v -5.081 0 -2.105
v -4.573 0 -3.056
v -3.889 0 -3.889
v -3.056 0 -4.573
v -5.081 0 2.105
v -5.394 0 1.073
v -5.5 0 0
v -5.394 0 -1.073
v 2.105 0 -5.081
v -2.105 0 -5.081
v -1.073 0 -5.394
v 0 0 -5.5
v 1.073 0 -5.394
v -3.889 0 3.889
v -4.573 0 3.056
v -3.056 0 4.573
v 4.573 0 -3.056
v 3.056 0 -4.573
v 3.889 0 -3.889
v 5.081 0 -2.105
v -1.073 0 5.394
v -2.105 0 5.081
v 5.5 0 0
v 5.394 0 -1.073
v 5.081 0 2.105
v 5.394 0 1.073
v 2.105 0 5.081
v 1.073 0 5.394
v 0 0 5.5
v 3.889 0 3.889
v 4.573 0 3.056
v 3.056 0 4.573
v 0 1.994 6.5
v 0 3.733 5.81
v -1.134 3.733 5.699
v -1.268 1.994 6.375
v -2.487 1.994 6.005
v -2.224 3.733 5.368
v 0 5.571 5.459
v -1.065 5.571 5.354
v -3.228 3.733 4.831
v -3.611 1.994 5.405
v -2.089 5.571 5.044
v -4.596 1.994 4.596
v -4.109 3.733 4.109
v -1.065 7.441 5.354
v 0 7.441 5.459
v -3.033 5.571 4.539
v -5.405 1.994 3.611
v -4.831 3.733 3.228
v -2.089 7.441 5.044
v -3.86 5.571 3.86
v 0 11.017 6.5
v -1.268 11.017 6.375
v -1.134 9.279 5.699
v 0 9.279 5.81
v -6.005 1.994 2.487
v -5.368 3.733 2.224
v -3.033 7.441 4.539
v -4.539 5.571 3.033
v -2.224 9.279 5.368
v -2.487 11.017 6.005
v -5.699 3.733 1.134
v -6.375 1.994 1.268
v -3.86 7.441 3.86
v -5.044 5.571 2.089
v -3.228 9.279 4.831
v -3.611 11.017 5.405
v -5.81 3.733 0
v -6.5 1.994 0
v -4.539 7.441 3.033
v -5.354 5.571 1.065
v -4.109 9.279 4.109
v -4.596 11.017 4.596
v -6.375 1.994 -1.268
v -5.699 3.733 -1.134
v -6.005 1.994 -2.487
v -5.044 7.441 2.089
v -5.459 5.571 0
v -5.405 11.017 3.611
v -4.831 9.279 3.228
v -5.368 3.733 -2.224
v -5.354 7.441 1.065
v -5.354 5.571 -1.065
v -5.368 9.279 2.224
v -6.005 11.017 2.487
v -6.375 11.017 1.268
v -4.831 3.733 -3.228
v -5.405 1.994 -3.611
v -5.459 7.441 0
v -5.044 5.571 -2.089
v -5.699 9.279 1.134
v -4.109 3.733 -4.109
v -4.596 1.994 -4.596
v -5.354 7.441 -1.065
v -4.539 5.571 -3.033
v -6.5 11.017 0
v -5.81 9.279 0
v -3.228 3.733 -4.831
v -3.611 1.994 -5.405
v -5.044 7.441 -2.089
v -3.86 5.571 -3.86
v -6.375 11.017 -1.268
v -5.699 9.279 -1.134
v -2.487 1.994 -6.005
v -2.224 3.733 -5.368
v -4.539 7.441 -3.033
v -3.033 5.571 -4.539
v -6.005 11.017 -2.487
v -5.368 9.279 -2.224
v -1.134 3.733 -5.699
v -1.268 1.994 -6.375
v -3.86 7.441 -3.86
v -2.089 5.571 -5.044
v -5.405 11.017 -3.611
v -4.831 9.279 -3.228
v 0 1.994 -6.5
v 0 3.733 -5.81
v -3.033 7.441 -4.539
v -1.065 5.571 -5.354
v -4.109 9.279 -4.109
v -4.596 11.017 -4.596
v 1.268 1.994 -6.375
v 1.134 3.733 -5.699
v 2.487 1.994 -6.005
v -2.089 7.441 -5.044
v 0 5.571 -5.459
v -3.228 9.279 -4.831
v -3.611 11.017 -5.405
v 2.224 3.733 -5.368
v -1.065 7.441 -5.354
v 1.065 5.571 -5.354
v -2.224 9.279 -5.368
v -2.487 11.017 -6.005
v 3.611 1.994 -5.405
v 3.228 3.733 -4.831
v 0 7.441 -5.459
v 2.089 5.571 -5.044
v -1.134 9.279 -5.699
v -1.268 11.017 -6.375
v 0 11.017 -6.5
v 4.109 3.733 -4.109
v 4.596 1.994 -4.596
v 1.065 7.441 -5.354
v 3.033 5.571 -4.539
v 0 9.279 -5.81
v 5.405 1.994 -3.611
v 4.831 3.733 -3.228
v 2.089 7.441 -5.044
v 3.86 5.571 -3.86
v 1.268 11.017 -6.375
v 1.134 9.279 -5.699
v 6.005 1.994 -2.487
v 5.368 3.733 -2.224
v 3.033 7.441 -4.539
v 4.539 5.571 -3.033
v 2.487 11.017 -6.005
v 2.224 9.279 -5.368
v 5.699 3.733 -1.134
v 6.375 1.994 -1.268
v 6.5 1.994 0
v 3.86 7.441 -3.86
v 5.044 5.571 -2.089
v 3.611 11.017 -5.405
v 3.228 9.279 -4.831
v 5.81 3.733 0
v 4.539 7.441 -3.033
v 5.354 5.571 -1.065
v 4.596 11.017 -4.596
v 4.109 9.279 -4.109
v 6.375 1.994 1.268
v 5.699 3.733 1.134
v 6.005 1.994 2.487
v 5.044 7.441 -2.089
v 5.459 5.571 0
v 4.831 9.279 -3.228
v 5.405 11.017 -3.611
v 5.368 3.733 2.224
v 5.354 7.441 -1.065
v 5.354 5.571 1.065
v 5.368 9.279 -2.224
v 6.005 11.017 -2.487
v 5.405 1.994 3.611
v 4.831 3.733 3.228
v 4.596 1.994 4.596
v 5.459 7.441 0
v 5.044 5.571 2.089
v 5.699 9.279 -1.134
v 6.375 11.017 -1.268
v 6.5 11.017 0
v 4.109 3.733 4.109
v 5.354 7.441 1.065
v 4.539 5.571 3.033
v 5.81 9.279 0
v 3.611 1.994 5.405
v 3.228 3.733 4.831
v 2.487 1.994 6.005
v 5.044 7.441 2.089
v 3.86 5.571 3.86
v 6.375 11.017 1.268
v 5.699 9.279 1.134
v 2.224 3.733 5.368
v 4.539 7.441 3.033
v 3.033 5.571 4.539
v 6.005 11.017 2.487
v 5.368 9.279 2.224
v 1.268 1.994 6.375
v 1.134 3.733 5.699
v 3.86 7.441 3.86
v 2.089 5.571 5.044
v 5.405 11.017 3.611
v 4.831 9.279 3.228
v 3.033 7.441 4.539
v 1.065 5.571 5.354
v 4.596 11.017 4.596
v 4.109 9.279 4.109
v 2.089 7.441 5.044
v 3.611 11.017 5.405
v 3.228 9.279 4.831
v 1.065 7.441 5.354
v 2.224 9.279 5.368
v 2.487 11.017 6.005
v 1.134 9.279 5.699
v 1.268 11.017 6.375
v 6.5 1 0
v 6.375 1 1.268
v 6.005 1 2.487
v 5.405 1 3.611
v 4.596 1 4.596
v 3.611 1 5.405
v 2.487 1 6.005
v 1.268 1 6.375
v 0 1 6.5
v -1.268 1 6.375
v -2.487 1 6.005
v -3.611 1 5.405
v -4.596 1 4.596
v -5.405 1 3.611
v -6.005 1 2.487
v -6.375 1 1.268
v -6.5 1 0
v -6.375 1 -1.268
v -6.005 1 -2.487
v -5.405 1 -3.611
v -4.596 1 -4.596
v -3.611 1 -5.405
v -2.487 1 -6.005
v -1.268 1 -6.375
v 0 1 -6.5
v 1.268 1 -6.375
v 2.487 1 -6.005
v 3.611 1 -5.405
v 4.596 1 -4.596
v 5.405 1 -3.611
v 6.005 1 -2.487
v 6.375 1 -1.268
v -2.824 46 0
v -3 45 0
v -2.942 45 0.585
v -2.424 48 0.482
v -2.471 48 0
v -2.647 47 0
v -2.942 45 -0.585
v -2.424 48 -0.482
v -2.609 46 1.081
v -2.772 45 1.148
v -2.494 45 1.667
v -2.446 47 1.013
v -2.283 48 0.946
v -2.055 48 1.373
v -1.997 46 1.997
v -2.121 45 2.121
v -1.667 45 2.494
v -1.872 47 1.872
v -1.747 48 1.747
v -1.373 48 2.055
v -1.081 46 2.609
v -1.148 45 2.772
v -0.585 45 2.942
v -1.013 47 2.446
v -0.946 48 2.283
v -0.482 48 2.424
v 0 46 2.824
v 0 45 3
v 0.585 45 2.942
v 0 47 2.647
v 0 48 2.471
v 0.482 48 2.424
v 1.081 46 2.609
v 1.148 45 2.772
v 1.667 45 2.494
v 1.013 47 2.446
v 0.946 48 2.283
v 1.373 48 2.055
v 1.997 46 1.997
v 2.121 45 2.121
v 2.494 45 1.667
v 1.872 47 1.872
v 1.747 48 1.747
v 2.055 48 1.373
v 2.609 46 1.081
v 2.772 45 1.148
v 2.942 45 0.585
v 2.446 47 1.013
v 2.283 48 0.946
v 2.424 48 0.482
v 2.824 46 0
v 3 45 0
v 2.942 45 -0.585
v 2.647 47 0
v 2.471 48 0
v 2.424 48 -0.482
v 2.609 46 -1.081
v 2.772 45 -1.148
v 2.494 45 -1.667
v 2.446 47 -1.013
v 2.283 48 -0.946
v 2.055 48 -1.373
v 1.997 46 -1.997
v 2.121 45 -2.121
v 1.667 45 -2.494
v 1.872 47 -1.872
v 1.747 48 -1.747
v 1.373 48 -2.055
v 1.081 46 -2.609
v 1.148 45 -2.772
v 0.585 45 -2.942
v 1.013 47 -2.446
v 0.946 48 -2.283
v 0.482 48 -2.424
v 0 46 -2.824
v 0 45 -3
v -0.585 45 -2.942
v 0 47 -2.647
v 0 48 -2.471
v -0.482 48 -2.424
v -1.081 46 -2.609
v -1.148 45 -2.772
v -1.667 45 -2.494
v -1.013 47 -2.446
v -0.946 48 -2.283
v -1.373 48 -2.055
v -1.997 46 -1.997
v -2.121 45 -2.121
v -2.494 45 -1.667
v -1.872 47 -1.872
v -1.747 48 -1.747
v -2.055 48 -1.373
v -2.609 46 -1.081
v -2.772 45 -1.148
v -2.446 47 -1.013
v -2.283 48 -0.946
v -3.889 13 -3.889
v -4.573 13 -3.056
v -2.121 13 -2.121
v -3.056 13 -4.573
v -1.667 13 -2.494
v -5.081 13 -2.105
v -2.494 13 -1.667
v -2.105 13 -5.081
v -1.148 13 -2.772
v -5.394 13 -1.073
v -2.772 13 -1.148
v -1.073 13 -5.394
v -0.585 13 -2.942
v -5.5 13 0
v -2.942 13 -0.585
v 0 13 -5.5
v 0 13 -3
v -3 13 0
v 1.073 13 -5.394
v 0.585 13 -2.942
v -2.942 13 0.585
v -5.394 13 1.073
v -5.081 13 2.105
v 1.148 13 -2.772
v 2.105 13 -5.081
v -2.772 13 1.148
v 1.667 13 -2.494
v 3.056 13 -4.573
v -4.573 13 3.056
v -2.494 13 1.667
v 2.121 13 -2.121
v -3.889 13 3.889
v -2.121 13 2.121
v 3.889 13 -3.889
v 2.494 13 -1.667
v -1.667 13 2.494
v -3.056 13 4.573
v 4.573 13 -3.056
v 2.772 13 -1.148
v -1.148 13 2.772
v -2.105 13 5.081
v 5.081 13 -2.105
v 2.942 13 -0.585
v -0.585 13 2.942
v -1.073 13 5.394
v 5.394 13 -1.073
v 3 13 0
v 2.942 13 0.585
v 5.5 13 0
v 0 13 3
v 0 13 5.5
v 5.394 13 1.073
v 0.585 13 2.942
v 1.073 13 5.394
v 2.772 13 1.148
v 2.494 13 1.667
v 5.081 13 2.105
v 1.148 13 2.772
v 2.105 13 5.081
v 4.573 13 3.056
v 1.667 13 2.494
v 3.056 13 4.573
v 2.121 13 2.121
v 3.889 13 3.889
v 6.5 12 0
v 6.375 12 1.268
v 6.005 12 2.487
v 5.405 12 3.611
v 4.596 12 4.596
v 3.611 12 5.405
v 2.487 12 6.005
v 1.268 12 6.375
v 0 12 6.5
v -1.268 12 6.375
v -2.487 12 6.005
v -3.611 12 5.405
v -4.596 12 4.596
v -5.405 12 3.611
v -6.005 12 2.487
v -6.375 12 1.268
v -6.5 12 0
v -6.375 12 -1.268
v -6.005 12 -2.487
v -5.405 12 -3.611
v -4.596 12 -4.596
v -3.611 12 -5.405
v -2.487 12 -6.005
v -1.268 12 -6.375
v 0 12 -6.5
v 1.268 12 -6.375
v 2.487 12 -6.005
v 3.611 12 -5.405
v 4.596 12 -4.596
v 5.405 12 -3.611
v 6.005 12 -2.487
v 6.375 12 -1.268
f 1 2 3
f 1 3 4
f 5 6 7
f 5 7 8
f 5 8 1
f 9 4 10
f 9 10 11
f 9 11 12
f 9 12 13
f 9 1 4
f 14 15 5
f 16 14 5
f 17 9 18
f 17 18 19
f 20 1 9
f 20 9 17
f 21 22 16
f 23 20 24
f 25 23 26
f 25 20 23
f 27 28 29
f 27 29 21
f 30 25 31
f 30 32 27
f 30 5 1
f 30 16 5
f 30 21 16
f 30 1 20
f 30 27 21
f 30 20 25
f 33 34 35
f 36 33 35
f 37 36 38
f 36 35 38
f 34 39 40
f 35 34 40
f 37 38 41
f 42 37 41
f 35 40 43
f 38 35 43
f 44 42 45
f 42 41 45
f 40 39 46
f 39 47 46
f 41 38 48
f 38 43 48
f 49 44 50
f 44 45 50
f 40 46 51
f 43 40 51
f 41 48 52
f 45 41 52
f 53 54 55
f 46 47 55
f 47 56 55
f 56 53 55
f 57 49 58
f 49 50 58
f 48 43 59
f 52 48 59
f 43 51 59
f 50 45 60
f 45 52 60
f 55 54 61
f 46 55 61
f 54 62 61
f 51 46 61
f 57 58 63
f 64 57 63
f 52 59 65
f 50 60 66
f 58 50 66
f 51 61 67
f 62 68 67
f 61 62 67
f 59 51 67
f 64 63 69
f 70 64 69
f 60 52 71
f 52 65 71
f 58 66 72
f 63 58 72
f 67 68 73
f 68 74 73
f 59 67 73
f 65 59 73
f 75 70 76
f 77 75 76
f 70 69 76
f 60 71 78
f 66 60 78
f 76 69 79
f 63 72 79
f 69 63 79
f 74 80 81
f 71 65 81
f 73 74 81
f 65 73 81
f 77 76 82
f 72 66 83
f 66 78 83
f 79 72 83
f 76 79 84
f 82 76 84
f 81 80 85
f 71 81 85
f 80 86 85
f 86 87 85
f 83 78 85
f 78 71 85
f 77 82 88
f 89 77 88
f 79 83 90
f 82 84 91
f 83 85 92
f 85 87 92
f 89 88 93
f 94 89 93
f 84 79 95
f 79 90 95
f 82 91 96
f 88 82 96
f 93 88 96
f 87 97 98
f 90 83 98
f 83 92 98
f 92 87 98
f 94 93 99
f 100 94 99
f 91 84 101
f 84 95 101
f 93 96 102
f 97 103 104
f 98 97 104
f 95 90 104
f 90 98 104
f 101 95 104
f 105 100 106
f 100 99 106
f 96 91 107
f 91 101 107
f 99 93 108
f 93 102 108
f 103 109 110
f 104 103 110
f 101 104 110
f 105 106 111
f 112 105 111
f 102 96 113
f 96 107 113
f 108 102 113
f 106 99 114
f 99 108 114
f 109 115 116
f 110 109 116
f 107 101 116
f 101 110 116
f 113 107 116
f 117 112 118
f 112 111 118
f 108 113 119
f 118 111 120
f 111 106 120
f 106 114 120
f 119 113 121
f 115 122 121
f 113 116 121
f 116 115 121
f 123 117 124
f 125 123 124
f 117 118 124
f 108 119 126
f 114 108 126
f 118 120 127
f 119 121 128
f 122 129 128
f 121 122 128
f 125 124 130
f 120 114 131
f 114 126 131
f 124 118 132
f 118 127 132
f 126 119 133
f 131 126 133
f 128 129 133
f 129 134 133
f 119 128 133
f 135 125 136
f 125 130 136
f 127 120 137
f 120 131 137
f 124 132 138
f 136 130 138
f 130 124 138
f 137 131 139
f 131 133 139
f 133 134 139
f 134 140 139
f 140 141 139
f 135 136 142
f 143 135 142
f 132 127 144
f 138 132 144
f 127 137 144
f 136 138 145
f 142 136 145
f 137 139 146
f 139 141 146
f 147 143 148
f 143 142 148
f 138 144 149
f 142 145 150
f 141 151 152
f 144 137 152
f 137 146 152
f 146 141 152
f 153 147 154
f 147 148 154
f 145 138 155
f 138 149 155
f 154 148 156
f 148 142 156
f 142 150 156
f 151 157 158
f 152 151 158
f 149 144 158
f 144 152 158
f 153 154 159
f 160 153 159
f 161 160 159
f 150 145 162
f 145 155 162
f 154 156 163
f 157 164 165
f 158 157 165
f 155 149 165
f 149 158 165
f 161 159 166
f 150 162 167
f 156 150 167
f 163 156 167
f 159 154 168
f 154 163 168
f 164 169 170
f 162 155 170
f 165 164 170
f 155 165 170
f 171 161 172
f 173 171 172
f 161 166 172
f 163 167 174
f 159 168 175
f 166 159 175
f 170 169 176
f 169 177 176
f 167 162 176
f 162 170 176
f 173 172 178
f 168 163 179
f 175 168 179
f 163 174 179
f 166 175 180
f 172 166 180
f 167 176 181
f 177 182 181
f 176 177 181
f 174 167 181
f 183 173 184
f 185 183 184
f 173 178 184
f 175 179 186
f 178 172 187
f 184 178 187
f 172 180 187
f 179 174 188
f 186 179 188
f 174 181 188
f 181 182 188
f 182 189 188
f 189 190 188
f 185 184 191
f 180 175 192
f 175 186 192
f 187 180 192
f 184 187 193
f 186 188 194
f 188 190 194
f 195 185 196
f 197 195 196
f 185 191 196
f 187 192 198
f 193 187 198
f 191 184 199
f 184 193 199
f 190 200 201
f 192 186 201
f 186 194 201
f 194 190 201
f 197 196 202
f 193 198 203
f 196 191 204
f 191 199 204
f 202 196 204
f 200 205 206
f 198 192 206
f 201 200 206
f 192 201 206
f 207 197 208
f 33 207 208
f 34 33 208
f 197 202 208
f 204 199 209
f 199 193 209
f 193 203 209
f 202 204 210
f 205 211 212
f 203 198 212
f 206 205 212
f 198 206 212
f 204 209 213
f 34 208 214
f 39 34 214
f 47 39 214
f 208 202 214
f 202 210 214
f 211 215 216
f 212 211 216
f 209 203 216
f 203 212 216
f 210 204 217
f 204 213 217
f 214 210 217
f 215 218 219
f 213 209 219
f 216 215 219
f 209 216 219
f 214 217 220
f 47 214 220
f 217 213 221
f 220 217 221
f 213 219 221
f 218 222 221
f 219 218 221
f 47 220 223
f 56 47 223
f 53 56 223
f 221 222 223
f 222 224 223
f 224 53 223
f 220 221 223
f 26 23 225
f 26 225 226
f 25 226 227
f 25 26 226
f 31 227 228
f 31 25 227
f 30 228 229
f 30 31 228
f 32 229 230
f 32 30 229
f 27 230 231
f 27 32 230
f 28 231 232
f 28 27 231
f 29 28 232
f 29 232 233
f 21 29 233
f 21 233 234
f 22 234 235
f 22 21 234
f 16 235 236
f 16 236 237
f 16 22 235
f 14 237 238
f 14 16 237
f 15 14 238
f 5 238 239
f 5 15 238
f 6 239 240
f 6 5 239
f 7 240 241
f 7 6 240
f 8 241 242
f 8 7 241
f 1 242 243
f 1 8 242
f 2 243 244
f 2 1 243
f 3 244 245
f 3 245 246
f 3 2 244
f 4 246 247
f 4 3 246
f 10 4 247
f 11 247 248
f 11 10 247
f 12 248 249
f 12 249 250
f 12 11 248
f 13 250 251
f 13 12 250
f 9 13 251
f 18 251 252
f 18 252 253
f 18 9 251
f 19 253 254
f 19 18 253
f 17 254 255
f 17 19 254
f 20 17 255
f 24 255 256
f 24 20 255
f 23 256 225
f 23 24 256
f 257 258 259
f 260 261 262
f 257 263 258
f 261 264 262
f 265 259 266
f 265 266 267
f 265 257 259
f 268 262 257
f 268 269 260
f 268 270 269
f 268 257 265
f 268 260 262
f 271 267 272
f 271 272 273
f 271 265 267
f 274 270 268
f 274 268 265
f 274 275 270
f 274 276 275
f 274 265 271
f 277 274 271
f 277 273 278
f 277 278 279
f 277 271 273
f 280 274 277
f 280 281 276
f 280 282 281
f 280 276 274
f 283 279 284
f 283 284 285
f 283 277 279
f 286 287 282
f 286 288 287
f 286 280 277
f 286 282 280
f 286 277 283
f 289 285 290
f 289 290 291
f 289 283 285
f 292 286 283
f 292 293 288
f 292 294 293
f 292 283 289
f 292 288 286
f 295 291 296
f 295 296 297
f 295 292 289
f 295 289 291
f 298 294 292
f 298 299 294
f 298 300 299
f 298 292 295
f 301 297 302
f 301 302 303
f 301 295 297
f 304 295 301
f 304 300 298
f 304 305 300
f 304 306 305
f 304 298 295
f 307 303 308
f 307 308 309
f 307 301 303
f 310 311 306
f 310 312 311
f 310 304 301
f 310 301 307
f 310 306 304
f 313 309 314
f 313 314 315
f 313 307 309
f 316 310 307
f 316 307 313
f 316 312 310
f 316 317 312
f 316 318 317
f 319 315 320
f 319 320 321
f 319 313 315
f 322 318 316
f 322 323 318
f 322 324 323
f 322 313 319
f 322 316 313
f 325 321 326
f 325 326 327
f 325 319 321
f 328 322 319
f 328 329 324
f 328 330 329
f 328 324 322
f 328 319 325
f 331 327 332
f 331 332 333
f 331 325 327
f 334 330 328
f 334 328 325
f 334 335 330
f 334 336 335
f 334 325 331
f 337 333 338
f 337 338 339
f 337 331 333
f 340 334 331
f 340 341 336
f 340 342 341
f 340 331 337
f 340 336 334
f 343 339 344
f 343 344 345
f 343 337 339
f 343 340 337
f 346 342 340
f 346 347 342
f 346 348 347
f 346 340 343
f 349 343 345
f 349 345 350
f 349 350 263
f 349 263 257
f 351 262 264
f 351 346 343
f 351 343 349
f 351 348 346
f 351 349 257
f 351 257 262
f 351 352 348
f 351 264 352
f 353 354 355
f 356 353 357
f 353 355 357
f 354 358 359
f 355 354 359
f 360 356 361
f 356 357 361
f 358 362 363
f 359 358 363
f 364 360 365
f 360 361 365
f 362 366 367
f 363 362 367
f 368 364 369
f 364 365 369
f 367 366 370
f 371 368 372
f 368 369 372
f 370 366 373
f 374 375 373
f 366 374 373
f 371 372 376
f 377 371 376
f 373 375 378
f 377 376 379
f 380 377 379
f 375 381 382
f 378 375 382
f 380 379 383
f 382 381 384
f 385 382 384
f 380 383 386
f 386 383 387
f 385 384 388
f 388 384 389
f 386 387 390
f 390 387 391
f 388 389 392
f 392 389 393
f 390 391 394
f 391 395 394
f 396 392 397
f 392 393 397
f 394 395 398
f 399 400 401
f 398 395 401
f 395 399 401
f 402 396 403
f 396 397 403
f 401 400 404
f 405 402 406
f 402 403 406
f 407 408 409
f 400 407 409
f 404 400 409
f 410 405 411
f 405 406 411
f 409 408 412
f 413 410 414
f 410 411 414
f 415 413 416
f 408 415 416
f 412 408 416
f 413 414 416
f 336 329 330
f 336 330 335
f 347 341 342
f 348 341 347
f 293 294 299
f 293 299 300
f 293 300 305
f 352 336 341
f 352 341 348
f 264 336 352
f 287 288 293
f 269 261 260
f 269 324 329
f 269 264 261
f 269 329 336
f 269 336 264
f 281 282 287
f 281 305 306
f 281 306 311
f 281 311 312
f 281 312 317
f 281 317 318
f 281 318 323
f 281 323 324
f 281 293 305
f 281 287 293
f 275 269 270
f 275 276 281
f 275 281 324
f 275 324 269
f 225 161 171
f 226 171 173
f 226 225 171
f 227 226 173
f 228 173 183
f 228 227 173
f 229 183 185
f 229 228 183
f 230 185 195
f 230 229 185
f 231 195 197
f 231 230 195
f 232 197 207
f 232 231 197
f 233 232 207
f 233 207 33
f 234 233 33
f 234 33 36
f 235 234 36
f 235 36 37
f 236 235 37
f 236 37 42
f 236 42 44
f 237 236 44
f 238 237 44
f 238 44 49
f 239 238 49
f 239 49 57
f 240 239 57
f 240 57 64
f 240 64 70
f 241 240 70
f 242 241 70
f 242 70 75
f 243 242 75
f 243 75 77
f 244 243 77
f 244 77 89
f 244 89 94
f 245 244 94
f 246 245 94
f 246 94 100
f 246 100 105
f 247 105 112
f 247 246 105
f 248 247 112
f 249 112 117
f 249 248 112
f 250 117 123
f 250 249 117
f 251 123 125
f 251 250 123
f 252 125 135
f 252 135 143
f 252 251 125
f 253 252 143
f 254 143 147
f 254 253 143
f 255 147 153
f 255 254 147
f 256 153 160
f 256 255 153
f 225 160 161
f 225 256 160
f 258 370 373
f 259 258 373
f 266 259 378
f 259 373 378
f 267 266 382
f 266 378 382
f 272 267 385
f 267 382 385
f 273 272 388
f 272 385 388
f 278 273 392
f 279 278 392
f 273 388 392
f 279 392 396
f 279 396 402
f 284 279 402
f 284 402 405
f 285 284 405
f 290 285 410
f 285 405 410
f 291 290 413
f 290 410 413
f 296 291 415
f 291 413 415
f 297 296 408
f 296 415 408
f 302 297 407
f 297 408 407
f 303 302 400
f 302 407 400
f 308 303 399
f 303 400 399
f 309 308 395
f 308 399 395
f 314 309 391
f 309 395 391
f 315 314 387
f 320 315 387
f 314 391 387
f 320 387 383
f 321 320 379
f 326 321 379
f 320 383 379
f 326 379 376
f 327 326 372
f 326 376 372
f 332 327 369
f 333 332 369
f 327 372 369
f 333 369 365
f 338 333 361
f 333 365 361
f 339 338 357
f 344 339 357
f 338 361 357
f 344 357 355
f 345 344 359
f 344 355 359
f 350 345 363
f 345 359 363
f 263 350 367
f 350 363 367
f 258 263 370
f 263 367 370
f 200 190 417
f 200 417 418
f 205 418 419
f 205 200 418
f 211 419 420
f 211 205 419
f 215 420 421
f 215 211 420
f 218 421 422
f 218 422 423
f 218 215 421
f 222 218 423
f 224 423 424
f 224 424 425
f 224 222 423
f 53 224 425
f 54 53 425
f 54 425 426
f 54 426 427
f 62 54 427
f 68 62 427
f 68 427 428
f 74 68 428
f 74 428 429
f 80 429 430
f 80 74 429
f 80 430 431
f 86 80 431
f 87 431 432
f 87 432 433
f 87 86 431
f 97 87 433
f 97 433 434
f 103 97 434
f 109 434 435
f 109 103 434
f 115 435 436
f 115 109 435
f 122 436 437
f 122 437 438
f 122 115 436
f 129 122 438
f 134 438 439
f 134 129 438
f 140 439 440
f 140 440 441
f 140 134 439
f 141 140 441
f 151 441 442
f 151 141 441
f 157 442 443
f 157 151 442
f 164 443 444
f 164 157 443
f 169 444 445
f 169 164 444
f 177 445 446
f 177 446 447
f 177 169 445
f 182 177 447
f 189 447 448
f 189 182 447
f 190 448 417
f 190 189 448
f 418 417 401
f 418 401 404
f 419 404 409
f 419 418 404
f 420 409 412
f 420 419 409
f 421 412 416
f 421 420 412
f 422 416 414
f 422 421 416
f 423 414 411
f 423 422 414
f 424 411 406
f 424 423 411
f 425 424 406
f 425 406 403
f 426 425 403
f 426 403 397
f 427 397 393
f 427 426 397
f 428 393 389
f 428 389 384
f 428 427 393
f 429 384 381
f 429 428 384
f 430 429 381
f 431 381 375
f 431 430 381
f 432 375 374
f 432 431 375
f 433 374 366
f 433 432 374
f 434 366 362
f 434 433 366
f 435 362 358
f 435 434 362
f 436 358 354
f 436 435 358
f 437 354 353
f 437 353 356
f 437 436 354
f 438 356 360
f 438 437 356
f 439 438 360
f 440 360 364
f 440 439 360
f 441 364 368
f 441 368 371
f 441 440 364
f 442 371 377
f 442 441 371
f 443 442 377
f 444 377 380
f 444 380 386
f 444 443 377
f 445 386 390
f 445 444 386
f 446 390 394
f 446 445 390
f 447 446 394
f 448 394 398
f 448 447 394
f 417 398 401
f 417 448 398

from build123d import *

# Parameters (mm, degrees)
F0_R     = 6.5
F1_DEPTH = 13
F2_R     = 3
F3_DEPTH = 35
F4_SIZE2 = 0.528981
F4_SIZE  = 3
F5_SIZE  = 1


with BuildPart() as f1:
    # F0 (on Front) → F1 (new body)
    with BuildSketch(Plane.XZ):
        Circle(F0_R)
    extrude(amount=-F1_DEPTH)

    # F2 (on face) → F3 (join)
    with BuildSketch(Plane(origin=(0, 13, 0), x_dir=(-1, 0, 0), z_dir=(0, 1, 0))):
        Circle(F2_R)
    extrude(amount=F3_DEPTH)

    # F4
    f4_edges = [f1.edges().sort_by_distance(p)[0] for p in [
        (3, 48, 0),
    ]]
    chamfer(f4_edges, length=F4_SIZE, length2=F4_SIZE2)

    # F5
    f5_edges = [f1.edges().sort_by_distance(p)[0] for p in [
        (-6.5, 13, 0),
        (-6.5, 0, 0),
    ]]
    chamfer(f5_edges, length=F5_SIZE)

    # F6 (on Right) → F7 (revolve, cut)
    with BuildSketch(Plane.YZ):
        with BuildLine():
            Line((12, 7.074941), (1, 7.082712))
            ThreePointArc((1, 7.082712), (6.498825, 5.41508), (12, 7.074941))
        make_face()
    revolve(axis=Axis((0, 13, 0), (0, -1, 0)), mode=Mode.SUBTRACT)


solid = f1.part
